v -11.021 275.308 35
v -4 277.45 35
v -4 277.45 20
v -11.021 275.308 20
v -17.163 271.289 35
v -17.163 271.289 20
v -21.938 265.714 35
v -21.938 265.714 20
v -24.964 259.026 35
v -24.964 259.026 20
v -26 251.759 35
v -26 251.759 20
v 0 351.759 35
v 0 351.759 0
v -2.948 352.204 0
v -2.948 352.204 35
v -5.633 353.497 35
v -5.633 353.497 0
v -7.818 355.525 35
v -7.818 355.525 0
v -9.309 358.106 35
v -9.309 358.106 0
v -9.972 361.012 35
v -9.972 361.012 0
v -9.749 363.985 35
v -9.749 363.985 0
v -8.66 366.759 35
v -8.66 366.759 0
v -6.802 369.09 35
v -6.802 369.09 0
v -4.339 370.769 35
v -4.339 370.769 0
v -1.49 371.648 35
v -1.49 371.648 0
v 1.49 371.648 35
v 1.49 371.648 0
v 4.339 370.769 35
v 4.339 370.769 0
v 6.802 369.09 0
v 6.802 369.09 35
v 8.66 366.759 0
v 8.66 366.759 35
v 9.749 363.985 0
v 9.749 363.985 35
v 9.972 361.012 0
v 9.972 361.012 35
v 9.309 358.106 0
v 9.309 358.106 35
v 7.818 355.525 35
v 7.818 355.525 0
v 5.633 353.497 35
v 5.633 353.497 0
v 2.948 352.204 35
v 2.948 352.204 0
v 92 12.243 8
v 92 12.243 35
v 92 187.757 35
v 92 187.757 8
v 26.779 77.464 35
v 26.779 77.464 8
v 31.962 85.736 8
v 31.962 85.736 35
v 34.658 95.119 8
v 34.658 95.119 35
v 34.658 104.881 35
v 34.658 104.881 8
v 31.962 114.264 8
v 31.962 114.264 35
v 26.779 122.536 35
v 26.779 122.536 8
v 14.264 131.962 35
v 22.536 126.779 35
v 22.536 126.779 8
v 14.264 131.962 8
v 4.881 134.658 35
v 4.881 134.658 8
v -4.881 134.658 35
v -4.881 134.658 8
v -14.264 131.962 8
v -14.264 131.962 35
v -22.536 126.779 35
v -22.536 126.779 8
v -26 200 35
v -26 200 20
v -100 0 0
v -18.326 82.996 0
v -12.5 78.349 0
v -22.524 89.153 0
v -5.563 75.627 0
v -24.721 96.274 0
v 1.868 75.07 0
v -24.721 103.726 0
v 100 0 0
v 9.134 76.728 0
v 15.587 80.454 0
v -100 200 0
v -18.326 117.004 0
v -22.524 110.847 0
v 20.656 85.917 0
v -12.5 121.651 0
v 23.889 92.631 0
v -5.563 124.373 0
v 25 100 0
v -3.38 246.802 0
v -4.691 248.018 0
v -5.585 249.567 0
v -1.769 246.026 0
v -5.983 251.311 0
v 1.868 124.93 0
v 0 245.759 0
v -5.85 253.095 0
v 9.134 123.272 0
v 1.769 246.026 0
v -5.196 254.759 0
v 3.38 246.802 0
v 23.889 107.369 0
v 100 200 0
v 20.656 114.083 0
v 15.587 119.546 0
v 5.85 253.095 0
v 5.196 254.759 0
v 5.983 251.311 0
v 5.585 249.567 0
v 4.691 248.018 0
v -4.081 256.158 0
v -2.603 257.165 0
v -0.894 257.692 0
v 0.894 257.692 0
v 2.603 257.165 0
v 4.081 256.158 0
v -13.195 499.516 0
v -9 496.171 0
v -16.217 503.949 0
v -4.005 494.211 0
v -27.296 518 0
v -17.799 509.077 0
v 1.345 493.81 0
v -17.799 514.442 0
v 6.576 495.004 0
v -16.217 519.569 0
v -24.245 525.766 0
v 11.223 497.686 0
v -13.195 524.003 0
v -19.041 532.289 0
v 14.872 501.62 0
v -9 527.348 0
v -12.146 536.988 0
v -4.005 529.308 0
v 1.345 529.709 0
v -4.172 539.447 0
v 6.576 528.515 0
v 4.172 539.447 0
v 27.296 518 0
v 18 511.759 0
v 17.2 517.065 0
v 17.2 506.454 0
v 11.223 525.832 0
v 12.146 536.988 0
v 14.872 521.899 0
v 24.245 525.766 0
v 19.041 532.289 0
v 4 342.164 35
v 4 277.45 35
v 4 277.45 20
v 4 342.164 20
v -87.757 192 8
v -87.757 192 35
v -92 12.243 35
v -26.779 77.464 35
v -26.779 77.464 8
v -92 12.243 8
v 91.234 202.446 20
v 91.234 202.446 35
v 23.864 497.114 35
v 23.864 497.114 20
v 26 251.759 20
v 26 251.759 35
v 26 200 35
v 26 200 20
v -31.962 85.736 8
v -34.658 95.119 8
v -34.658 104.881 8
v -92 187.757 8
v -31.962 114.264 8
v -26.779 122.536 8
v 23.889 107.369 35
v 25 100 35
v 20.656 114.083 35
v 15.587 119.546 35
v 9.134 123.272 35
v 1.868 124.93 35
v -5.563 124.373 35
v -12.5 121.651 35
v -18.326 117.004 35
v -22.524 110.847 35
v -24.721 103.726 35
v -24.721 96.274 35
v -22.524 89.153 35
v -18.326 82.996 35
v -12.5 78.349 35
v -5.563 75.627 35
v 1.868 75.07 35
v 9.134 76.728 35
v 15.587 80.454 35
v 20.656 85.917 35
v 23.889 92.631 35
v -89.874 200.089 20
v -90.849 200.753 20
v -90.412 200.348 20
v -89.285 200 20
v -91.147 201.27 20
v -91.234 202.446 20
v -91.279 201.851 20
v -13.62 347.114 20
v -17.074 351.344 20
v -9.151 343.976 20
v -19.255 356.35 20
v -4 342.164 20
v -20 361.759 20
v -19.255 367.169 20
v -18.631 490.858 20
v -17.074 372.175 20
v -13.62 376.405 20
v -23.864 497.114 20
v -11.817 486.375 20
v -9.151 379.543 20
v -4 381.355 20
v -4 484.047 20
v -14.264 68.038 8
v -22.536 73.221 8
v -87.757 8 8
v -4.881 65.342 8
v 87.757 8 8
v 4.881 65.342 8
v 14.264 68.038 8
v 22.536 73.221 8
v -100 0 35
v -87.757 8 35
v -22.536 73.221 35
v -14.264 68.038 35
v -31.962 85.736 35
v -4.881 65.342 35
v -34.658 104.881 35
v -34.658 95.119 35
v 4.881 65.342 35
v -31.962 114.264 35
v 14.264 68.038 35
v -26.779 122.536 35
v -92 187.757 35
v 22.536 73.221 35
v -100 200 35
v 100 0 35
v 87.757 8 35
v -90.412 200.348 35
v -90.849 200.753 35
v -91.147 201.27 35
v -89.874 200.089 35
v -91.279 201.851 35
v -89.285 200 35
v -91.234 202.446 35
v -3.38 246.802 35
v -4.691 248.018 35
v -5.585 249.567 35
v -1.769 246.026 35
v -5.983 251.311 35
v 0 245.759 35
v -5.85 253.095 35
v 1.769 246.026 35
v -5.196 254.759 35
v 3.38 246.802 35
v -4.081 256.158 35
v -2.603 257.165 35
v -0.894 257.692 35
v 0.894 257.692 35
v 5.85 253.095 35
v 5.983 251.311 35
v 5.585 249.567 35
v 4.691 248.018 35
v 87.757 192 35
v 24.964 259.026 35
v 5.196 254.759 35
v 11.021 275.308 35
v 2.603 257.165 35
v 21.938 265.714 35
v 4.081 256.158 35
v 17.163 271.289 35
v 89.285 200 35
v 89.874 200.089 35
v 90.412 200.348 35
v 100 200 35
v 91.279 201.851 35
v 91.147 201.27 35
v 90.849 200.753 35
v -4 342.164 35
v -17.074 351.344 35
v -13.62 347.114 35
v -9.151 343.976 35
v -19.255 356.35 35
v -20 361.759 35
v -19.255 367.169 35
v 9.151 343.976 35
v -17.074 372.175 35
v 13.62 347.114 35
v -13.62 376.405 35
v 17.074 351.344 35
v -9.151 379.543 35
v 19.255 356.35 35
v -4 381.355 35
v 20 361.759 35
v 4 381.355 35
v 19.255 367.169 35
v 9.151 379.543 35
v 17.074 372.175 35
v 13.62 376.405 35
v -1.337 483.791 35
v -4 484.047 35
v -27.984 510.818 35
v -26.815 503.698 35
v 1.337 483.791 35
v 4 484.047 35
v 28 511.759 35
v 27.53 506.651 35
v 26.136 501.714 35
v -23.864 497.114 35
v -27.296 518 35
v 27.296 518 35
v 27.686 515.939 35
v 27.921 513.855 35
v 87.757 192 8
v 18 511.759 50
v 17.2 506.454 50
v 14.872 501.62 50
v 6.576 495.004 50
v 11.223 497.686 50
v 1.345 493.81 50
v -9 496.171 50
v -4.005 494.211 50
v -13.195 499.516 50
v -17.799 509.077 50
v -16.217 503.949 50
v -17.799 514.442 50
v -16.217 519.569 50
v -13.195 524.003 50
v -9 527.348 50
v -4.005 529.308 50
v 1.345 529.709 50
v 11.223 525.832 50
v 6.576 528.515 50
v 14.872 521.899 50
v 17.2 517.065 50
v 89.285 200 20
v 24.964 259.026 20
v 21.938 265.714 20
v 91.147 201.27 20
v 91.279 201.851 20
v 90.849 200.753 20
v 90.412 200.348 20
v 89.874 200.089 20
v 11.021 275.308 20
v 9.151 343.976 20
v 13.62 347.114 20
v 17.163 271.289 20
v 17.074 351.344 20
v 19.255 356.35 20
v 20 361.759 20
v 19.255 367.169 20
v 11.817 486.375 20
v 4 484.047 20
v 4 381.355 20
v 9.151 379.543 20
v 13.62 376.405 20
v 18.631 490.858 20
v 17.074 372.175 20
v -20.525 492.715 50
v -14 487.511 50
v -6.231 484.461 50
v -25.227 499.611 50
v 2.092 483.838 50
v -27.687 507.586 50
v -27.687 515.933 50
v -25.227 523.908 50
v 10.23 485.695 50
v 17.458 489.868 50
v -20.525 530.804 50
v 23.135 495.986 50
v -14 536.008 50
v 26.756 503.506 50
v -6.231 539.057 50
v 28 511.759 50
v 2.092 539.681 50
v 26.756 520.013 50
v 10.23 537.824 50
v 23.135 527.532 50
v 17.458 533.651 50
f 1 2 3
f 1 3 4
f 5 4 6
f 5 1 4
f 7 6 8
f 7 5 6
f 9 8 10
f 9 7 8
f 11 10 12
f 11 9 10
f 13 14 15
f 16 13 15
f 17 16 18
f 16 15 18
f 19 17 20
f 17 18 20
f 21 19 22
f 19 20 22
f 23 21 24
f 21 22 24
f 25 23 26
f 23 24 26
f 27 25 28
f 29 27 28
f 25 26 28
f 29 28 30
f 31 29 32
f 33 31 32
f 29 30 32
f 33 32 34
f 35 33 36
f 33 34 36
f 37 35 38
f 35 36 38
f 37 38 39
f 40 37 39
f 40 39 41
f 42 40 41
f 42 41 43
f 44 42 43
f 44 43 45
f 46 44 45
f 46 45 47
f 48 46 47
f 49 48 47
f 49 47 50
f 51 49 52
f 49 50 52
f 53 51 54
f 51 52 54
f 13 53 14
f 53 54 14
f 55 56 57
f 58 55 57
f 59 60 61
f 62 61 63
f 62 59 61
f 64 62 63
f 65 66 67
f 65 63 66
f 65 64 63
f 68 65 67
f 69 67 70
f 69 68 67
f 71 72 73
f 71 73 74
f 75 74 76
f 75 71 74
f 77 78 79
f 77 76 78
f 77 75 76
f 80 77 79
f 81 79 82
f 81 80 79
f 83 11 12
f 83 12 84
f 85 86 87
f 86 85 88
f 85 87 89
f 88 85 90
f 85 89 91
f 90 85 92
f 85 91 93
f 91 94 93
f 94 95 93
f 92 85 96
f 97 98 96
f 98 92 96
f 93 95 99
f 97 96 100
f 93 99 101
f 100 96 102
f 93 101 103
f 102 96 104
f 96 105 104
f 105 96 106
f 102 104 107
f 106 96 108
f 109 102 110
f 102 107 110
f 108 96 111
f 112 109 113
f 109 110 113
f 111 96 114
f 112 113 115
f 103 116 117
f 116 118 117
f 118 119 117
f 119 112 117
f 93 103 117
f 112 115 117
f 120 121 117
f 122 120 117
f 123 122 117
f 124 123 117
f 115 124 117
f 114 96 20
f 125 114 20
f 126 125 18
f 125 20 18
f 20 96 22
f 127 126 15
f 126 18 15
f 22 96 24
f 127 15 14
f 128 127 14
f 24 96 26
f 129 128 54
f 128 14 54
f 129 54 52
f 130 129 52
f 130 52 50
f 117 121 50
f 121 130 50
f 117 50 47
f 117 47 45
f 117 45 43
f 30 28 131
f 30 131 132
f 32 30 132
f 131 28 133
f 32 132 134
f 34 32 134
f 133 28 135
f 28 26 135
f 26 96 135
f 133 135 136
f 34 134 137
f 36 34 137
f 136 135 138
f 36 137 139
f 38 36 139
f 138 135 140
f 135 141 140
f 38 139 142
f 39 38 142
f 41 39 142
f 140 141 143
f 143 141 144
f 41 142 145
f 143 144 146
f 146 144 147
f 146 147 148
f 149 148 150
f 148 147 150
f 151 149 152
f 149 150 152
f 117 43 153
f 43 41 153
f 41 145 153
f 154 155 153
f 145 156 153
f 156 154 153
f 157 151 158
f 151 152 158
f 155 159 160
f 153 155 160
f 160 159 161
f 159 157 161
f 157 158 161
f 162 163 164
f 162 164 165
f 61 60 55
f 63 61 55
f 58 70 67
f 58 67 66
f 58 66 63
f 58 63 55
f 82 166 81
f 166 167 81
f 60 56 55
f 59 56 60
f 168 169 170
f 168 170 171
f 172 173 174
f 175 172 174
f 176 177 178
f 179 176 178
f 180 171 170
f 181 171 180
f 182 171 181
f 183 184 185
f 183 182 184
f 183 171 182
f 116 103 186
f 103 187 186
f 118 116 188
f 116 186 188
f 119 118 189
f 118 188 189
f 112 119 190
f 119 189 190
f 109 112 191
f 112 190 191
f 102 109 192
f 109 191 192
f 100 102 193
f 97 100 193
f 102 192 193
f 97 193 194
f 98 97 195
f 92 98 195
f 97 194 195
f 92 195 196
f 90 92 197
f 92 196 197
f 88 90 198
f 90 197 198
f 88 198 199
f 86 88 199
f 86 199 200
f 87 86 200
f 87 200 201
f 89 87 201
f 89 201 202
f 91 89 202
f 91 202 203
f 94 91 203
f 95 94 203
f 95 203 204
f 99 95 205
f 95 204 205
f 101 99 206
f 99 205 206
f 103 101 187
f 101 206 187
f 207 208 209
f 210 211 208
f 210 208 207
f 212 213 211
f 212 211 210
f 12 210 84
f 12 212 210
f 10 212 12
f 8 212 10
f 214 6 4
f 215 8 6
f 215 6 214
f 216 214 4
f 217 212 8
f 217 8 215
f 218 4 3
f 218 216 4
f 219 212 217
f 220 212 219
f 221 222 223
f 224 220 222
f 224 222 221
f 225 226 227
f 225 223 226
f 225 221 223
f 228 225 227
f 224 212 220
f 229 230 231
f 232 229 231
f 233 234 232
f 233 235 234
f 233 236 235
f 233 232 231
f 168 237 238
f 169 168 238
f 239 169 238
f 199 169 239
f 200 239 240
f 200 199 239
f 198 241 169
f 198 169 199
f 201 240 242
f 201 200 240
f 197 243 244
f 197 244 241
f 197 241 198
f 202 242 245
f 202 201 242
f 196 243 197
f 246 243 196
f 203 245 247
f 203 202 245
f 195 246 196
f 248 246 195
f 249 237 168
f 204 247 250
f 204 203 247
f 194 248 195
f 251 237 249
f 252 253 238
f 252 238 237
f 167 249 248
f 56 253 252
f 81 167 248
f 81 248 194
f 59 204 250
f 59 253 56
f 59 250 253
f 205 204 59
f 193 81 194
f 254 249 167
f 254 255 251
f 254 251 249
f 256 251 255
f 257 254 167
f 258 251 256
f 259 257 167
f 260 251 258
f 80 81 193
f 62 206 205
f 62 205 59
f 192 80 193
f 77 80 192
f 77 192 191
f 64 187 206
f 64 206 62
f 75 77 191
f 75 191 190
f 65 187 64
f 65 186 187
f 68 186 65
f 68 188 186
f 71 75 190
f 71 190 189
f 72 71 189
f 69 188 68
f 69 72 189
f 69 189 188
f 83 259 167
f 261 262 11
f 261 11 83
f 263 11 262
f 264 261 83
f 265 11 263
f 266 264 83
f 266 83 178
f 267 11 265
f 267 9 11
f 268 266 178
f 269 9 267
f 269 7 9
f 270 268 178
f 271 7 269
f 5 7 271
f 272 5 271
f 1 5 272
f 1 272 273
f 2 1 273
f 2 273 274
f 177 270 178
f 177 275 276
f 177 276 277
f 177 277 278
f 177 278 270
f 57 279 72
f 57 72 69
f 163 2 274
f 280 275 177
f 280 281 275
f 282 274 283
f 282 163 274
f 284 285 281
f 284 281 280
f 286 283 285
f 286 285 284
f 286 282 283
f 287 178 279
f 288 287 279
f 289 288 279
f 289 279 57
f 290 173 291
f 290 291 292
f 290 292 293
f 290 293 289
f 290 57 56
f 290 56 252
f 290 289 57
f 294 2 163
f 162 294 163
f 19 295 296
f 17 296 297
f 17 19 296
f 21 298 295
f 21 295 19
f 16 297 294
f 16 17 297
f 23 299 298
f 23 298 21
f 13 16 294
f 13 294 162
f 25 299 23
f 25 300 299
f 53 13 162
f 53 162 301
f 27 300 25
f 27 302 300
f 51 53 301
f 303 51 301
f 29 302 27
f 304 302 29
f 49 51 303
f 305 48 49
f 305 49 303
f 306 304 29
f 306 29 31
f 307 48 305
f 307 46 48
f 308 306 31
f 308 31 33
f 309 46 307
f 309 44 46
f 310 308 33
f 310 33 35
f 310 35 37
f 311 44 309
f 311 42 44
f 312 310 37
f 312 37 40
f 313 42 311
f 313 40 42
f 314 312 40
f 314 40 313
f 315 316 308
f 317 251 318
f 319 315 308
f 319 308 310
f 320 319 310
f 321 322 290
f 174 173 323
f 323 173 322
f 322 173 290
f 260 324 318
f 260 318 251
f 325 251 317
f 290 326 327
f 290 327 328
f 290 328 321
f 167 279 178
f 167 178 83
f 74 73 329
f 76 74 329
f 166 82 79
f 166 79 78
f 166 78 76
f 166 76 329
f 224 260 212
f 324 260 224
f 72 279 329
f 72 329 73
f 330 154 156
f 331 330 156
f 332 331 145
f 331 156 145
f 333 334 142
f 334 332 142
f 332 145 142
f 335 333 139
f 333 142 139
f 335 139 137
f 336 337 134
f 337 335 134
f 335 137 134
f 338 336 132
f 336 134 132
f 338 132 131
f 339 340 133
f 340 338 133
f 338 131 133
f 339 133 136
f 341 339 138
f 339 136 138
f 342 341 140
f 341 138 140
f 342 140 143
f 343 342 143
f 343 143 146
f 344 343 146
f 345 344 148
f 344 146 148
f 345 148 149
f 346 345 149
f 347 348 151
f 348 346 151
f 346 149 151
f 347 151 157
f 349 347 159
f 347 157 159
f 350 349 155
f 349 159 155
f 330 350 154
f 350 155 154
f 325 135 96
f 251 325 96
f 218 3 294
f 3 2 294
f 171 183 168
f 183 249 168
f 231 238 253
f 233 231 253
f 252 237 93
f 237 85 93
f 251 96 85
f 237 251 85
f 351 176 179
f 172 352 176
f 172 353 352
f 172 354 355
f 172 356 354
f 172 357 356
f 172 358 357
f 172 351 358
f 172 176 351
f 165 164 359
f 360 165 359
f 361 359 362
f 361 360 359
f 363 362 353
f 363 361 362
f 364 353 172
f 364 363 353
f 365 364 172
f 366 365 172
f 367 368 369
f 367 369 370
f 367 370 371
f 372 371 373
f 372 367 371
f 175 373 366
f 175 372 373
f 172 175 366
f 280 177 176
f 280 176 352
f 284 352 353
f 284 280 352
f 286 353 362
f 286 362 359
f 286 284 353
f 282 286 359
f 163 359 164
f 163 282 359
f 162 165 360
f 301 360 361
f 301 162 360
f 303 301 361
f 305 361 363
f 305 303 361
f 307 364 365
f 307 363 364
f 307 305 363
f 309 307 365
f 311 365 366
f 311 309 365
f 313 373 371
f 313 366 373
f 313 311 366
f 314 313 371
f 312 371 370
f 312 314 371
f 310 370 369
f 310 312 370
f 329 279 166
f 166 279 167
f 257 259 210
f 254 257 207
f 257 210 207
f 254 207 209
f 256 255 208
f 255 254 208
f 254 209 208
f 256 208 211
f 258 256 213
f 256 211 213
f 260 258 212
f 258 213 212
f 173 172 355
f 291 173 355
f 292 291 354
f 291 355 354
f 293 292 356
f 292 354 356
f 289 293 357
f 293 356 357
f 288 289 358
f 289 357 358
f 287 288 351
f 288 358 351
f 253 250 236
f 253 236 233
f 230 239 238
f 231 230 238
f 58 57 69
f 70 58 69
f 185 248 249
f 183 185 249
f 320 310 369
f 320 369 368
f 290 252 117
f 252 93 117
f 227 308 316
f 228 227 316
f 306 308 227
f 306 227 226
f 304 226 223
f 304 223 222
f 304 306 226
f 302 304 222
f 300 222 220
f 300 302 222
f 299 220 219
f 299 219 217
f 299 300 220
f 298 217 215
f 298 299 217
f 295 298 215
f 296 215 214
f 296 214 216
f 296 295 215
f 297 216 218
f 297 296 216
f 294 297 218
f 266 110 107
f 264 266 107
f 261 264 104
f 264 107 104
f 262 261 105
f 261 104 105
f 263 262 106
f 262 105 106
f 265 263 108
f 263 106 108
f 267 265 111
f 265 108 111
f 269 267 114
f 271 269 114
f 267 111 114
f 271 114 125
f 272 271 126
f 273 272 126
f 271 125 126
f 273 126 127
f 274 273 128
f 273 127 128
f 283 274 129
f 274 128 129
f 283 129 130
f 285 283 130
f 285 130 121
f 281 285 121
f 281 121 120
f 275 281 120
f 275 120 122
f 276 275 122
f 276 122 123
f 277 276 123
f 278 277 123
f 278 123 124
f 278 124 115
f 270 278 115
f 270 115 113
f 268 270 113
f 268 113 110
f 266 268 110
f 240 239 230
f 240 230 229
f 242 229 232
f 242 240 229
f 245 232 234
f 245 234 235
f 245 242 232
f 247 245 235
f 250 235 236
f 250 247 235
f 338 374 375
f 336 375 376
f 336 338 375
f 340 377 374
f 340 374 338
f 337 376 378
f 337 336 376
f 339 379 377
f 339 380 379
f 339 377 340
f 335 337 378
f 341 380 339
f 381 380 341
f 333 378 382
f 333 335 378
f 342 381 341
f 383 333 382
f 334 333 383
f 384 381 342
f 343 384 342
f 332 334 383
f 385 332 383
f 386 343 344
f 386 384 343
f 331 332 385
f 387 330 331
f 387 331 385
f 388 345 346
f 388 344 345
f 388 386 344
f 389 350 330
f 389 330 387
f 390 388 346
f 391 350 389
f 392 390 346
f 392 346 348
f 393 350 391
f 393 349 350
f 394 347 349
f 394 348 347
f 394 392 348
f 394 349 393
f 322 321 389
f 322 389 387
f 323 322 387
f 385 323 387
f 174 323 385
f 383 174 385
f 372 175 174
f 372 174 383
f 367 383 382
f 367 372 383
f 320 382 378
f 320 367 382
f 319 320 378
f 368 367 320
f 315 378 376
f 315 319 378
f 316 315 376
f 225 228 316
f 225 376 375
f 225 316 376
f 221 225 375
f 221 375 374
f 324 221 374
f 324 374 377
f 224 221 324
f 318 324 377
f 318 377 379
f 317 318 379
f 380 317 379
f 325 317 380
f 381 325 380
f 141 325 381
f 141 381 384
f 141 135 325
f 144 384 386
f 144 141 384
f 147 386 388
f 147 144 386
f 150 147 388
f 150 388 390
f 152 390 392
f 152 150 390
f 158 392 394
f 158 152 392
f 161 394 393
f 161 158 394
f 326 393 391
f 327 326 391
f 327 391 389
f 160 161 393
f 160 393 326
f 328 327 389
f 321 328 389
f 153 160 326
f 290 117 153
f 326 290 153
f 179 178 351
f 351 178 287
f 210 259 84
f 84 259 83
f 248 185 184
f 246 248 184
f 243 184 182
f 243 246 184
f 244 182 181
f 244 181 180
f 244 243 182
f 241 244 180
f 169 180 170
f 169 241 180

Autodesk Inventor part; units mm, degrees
ref_plane "XY Plane" through (0, 0, 0) normal (0, 0, 1) x (1, 0, 0)
sketch "Skizze1" plane through (0, 0, 0) normal (0, 0, 1) x (1, 0, 0)
  line L0 (-100, 0) -> (100, 0)
  line L1 (100, 0) -> (100, 200)
  circle A0 centre (0, 511.7594) radius 28
  line L2 (-27.2957, 518) -> (-100, 200)
  line L3 (-100, 200) -> (-100, 0)
  line L4 (0, 511.7594) -> (0, 0) construction
  circle A1 centre (0, 511.7594) radius 18
  line L5 (100, 200) -> (27.2957, 518)
  point P0 (27.2957, 518)
  dimension "d0" = 56
  dimension "d1" = 36
  dimension "d2" = 518
  dimension "d3" = 200
  dimension "d4" = 200
  dimension "d8" = 318
extrude "Extrusion1" add sketch "Skizze1" along normal blind 50 contours A0
extrude "Extrusion2" add sketch "Skizze1" along normal blind 35 contours L3 L2 A0 L5 L1 L0
sketch "Skizze6" plane through (0, 0, 35) normal (0, 0, 1) x (1, 0, 0)
  line L0 (-100, 200) -> (-100, 0) projected
  line L1 (100, 0) -> (100, 200) projected
  line L2 (-100, 0) -> (100, 0) projected
  line L3 (0, 0) -> (0, 223.6261) construction
  line L4 (100, 100) -> (-100, 100) construction
  line L5 (0, 100) -> (-100, 200) construction
  circle A0 centre (0, 100) radius 35
  line L6 (-92, 8) -> (92, 8)
  line L7 (92, 8) -> (92, 192)
  line L8 (92, 192) -> (-92, 192)
  line L9 (-92, 192) -> (-92, 8)
  line L10 (-26.779, 122.5363) -> (-92, 187.7574)
  line L11 (-22.5363, 126.779) -> (-87.7574, 192)
  line L12 (0, 100) -> (-92, 8) construction
  line L13 (-22.5363, 73.221) -> (-87.7574, 8)
  line L14 (-26.779, 77.4637) -> (-92, 12.2426)
  line L15 (0, 100) -> (92, 8) construction
  line L16 (26.779, 77.4637) -> (92, 12.2426)
  line L17 (22.5363, 73.221) -> (87.7574, 8)
  point P0 (0, 8)
  point P1 (0, 0)
  dimension "d36" = 100
  dimension "d37" = 70
  dimension "d38" = 8
  dimension "d39" = 8
  dimension "d40" = 8
  dimension "d41" = 6
  dimension "d42" = 45
  dimension "d43" = 6
  dimension "d47" = 6
ref_plane "Arbeitsebene1" through (0, 0, 0) normal (1, 0, 0) x (0, 1, 0)
extrude "Extrusion8" cut sketch "Skizze6" against normal blind 27 contours A0 L14 L9 L10
extrude "Extrusion9" cut sketch "Skizze6" against normal blind 27 contours L17 L6 L13 A0
mirror "Spiegeln2" about plane through (0, 0, 0) normal (1, 0, 0) of "Extrusion8"
ref_plane "Arbeitsebene2" through (0, 100, 0) normal (0, 1, 0) x (-1, 0, 0)
mirror "Spiegeln3" about plane through (0, 100, 0) normal (0, 1, 0) of "Extrusion9"
sketch "Skizze7" plane through (0, 0, 35) normal (0, 0, 1) x (1, 0, 0)
  circle A0 centre (0, 100) radius 25
  line L0 (-100, 0) -> (100, 0) projected
  point P0 (0, 0)
  point P1 (0, 0)
  point P2 (0, 0)
  dimension "d53" = 50
  dimension "d54" = 100
extrude "Extrusion10" cut sketch "Skizze7" against normal up to surface (35 mm away)
sketch "Skizze8" plane through (0, 0, 35) normal (0, 0, 1) x (1, 0, 0)
  line L0 (-87.7574, 192) -> (87.7574, 192) projected
  circle A0 centre (0, 511.7594) radius 28 projected
  line L1 (91.7936, 200) -> (23.8644, 497.114)
  line L2 (-91.7936, 200) -> (-23.8644, 497.114)
  line L3 (-27.2957, 518) -> (-100, 200) projected
  line L4 (100, 200) -> (27.2957, 518) projected
  arc A1 (26, 251.7594) -> (-26, 251.7594) centre (0, 251.7594) ccw
  line L5 (-26, 251.7594) -> (-26, 200)
  line L6 (26, 251.7594) -> (26, 200)
  line L7 (0, 511.7594) -> (0, 277.7594) construction
  line L8 (-91.7936, 200) -> (-26, 200)
  line L9 (26, 200) -> (91.7936, 200)
  line L10 (-100, 0) -> (100, 0) projected
  circle A2 centre (0, 361.7594) radius 20
  line L11 (-4, 277.4499) -> (-4, 342.1635)
  line L12 (4, 277.4499) -> (4, 342.1635)
  line L13 (-4, 381.3553) -> (-4, 484.0466)
  line L14 (4, 381.3553) -> (4, 484.0466)
  point P0 (0, 0)
  point P1 (0, 0)
  dimension "d57" = 8
  dimension "d60" = 8
  dimension "d64" = 260
  dimension "d65" = 26
  dimension "d66" = 40
  dimension "d67" = 110
  dimension "d68" = 8
extrude "Extrusion11" cut sketch "Skizze8" against normal blind 15 contours L1 L9 L6 A1 L12 A2 L14 A0 | A0 L13 A2 L11 A1 L5 L8 L2
sketch "Skizze9" plane through (0, 0, 35) normal (0, 0, 1) x (1, 0, 0)
  arc A0 (26, 251.7594) -> (4, 277.4499) centre (0, 251.7594) ccw projected
  point P0 (0, 0)
hole "Bohrung1" at (0, 251.7594, 35) direction (0, 0, -1) diameter 12 depth 35
sketch "Skizze10" plane through (0, 0, 35) normal (0, 0, 1) x (1, 0, 0)
  arc A0 (-4, 381.3553) -> (-4, 342.1635) centre (0, 361.7594) ccw projected
  point P0 (0, 0)
hole "Bohrung2" at (0, 361.7594, 35) direction (0, 0, -1) diameter 20 depth 35
fillet "Rundung1" radius 2 2 edges at (-91.7936, 200, 27.5) (91.7936, 200, 27.5)
equation "\"d43\" = d41"
equation "\"d47\" = d41"
properties part number "boat" material "Stahl, galvanisiert"
